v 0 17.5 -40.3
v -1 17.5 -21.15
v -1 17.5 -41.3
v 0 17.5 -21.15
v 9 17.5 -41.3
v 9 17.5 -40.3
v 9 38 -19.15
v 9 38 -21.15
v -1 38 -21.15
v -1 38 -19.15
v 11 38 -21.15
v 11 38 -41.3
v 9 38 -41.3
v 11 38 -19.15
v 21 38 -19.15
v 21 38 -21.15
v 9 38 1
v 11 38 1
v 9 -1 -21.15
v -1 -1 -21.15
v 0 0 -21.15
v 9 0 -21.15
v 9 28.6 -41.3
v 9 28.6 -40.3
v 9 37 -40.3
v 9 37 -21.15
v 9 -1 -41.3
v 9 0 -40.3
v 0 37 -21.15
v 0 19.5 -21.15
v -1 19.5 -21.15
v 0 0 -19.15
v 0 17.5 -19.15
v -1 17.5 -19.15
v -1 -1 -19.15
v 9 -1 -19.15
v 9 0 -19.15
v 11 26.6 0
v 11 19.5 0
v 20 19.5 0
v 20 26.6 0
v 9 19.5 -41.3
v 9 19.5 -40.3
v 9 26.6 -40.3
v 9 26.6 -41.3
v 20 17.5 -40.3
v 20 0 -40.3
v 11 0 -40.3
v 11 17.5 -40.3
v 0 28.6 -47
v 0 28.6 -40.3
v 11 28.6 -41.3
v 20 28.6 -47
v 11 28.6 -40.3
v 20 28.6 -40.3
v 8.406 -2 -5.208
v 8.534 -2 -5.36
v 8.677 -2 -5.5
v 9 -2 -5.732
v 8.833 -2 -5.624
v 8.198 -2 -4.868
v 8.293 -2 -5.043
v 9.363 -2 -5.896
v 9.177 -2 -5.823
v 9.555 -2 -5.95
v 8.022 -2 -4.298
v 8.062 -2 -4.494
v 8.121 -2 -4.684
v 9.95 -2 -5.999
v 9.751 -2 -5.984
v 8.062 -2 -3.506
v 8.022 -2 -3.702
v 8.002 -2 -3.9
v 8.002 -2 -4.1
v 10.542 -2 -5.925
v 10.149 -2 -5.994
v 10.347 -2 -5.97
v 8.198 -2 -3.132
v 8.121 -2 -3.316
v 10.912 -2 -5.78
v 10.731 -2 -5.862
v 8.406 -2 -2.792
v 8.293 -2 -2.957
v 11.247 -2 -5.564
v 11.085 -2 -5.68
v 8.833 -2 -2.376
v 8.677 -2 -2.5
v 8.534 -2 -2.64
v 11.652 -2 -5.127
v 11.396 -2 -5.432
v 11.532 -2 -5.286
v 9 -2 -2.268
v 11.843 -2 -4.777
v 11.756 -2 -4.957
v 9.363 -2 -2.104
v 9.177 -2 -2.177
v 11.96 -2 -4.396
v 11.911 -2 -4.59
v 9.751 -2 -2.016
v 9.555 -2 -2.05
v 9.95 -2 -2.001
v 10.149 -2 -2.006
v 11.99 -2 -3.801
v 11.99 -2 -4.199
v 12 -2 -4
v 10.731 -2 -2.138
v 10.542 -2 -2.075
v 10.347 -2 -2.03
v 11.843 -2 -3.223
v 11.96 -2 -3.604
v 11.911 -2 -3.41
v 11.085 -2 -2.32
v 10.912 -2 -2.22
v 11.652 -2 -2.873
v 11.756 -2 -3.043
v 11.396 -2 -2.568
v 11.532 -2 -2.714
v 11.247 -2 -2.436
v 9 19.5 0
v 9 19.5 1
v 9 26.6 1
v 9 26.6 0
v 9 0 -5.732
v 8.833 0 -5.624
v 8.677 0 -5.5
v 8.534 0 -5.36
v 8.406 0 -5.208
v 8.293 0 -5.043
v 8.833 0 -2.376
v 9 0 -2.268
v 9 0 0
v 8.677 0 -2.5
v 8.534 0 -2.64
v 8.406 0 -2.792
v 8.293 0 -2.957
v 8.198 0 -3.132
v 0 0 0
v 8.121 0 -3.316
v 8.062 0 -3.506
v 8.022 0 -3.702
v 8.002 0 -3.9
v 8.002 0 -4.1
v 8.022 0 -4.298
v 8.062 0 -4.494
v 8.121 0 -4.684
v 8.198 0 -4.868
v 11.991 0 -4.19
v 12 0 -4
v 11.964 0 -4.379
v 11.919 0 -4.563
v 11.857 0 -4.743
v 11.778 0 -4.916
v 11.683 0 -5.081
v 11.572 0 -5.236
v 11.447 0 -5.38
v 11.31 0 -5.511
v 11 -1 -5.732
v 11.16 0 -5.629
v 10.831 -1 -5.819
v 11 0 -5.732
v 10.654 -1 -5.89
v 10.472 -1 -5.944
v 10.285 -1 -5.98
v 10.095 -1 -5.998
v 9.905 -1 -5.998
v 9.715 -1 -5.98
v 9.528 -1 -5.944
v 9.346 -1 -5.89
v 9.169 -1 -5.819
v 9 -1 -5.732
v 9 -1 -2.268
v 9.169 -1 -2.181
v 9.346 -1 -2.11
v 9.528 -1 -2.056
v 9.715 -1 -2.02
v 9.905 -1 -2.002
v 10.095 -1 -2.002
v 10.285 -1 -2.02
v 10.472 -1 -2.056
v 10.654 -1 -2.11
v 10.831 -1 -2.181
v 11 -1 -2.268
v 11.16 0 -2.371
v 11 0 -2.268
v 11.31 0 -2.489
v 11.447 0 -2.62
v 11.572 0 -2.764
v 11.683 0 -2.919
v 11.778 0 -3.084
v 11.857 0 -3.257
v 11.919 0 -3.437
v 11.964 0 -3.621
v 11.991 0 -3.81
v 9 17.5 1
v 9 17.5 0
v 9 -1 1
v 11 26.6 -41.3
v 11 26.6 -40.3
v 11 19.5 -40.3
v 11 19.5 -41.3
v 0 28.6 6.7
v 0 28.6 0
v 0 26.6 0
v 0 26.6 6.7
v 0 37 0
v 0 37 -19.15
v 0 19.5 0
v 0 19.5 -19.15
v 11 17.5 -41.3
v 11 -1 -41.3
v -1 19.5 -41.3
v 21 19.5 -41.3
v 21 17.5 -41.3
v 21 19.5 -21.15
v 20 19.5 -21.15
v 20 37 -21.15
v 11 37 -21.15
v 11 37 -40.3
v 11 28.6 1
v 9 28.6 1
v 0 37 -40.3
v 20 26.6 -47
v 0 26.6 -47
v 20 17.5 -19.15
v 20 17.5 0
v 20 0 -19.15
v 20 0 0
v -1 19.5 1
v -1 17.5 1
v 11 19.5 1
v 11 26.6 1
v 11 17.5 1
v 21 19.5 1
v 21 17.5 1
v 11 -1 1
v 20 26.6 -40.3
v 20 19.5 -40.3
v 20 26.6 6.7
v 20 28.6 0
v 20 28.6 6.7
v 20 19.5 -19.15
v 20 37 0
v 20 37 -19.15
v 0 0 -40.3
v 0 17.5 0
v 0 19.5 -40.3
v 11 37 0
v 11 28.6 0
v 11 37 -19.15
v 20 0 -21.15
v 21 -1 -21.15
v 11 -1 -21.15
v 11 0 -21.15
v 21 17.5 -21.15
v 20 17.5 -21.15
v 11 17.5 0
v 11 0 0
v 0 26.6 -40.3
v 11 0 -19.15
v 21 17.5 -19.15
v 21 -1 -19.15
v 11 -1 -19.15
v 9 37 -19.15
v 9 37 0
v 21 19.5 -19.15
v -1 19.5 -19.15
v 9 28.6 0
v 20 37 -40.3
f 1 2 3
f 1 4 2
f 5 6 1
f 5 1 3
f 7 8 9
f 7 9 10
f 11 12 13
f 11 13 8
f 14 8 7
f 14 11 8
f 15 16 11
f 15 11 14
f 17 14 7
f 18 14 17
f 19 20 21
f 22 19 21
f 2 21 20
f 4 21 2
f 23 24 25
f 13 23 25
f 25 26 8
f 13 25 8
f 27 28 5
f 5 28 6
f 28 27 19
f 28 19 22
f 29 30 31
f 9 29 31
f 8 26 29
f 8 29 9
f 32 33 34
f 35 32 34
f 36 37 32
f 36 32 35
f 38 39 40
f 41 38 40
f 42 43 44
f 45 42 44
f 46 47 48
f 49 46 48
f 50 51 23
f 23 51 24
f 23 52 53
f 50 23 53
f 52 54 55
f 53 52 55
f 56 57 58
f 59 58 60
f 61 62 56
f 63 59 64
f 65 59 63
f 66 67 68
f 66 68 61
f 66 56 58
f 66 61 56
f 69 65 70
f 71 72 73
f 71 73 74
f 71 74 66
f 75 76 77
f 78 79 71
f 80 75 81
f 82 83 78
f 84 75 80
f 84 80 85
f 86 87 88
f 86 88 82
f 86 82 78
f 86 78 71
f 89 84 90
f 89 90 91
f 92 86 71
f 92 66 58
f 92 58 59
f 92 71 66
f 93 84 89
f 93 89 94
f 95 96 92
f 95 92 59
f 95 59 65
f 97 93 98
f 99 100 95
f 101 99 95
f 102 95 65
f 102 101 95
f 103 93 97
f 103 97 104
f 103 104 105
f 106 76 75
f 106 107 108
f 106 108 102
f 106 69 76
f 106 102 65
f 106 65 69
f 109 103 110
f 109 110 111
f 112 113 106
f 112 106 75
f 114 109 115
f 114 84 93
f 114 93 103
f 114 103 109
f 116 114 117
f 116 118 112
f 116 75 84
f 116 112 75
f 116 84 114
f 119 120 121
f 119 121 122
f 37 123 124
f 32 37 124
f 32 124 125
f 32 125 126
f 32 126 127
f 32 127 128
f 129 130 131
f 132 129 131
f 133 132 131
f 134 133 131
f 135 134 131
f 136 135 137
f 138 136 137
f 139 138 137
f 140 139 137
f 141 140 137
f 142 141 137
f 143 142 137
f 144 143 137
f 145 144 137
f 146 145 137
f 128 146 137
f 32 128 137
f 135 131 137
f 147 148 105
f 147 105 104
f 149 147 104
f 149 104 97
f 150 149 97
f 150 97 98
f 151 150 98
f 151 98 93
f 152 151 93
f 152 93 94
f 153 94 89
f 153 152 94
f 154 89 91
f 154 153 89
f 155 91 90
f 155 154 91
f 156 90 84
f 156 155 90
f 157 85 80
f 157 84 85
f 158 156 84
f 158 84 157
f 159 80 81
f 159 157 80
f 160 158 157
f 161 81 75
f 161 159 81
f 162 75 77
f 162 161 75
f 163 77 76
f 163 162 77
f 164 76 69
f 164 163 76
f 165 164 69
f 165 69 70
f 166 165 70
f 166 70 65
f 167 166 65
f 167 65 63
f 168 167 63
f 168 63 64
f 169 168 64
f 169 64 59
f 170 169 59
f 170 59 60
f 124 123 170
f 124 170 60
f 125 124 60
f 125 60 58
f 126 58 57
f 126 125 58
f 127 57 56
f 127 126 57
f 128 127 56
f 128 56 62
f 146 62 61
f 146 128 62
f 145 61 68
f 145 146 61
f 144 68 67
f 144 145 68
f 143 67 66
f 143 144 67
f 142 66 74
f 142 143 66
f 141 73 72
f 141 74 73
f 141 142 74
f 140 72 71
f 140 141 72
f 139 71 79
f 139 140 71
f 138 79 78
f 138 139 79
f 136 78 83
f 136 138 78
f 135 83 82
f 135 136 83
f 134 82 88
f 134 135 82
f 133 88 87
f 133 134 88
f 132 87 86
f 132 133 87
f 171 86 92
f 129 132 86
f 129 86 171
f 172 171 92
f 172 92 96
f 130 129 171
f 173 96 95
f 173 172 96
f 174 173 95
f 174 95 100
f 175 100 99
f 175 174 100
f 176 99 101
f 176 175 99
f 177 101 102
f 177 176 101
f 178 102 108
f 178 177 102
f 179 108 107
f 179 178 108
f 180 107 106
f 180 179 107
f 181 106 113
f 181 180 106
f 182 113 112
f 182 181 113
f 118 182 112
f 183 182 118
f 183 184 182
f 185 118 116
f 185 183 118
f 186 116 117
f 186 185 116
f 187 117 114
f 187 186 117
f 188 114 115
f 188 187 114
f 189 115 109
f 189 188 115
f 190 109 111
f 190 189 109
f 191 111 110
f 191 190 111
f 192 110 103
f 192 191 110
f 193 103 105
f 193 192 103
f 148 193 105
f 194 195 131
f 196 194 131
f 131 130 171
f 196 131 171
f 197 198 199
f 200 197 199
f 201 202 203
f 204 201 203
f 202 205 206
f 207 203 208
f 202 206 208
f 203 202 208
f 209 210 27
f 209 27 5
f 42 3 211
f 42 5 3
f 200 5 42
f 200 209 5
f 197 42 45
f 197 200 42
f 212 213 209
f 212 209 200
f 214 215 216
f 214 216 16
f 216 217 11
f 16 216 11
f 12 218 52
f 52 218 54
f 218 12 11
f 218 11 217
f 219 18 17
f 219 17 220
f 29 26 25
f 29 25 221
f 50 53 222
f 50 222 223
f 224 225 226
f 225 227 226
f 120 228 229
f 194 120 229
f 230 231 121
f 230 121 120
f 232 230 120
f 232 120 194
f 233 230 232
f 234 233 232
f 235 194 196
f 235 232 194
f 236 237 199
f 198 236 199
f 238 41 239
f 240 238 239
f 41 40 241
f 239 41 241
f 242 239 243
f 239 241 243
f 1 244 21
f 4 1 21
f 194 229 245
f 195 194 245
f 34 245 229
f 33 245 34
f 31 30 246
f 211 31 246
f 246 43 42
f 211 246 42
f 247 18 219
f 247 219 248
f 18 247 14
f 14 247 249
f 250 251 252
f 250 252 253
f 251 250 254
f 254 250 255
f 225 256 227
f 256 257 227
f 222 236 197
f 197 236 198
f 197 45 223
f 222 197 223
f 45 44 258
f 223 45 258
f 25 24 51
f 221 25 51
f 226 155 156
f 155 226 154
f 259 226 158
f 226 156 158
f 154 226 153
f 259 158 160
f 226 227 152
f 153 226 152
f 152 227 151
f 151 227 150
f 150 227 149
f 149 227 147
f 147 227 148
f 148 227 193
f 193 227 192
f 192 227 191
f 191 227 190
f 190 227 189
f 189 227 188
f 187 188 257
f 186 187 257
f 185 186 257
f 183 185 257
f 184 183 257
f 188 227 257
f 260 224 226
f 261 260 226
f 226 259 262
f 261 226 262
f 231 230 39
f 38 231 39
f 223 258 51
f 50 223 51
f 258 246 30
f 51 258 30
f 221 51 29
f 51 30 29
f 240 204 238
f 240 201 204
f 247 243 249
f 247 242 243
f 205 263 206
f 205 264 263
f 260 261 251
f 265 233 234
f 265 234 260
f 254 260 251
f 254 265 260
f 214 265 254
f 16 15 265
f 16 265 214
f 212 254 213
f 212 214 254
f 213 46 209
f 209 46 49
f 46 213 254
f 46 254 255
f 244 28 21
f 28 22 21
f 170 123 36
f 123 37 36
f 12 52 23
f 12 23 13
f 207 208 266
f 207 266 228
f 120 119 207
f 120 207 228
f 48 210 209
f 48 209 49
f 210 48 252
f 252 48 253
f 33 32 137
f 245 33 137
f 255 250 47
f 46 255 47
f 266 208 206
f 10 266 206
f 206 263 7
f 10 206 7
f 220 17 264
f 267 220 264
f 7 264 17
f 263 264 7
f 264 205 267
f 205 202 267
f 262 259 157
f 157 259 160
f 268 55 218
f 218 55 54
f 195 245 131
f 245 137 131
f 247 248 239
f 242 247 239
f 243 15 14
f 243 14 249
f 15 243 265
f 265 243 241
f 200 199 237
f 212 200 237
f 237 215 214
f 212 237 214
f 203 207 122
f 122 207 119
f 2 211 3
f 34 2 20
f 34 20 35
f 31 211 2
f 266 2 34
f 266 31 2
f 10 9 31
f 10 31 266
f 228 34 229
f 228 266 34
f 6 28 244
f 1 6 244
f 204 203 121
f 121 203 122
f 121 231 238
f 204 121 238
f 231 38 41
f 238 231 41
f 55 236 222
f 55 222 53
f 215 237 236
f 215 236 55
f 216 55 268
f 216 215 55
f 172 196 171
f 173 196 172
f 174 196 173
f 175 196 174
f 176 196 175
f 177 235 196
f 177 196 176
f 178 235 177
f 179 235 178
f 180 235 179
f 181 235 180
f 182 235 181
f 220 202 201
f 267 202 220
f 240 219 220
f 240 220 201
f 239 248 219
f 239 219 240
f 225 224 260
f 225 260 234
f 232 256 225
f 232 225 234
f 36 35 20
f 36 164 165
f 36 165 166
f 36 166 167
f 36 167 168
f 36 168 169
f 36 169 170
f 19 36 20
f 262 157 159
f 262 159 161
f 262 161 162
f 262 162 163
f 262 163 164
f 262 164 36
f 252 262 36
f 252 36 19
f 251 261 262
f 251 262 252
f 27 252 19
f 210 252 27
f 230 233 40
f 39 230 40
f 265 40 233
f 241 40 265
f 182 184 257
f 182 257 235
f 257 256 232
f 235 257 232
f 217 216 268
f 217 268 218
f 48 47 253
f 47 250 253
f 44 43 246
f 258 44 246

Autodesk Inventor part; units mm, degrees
ref_plane "YZ Plane" through (0, 0, 0) normal (1, 0, 0) x (0, 1, 0)
ref_plane "XZ Plane" through (0, 0, 0) normal (0, 1, 0) x (-1, 0, 0)
ref_plane "XY Plane" through (0, 0, 0) normal (0, 0, 1) x (1, 0, 0)
sketch "Sketch1" plane through (0, 0, 0) normal (0, 1, 0) x (-1, 0, 0)
  line L0 (0, 0) -> (-20, 0)
  line L1 (-20, 0) -> (-20, -40.3)
  line L2 (-20, -40.3) -> (0, -40.3)
  line L3 (0, -40.3) -> (0, 0)
  dimension "d0" = 20
  dimension "d1" = 40.3
extrude "Extrusion1" add sketch "Sketch1" along normal blind 37
sketch "Sketch2" plane through (20, 0, 0) normal (1, 0, 0) x (0, 0, -1)
  line L0 (0, 0) -> (40.3, 0) projected
  line L1 (40.3, 0) -> (40.3, 37) projected
  line L2 (21.15, 37) -> (19.15, 37)
  line L3 (19.15, 37) -> (19.15, 0)
  line L4 (19.15, 0) -> (21.15, 0)
  line L5 (21.15, 0) -> (21.15, 37)
  line L6 (0, 37) -> (40.3, 37) projected
  line L7 (0, 19.5) -> (40.3, 19.5)
  line L8 (40.3, 19.5) -> (40.3, 17.5)
  line L9 (40.3, 17.5) -> (0, 17.5)
  line L10 (0, 17.5) -> (0, 19.5)
  line L11 (0, 0) -> (0, 37) projected
  point P0 (19.15, 19.5)
  point P1 (19.15, 17.5)
  point P2 (21.15, 17.5)
  point P3 (21.15, 19.5)
  dimension "d5" = 2
  dimension "d6" = 19.15
  dimension "d7" = 0
  dimension "d9" = 2
  dimension "d10" = 17.5
  dimension "d11" = 0
extrude "Extrusion2" add sketch "Sketch2" along normal blind 1 contours L3 L9 L5 L0 | L10 L7 L3 L9 | L3 L7 L5 L9 | L5 L7 L1 L9 | L3 L2 L5 L7
sketch "Sketch3" plane through (0, 0, 0) normal (0, -1, 0) x (1, 0, 0)
  line L0 (0, 0) -> (20, 0) projected
  line L1 (0, -40.3) -> (0, 0) projected
  line L2 (20, -40.3) -> (0, -40.3) projected
  line L3 (20, -21.15) -> (21, -21.15) projected
  line L4 (21, -19.15) -> (21, -21.15) projected
  line L5 (20, -19.15) -> (21, -19.15) projected
  line L6 (21, -19.15) -> (0, -19.15)
  line L7 (0, -19.15) -> (0, -21.15)
  line L8 (0, -21.15) -> (21, -21.15)
  line L9 (21, -21.15) -> (21, -19.15)
  line L10 (0, 0) -> (20, 0) projected
  line L11 (11, 0) -> (9, 0)
  line L12 (9, 0) -> (9, -40.3)
  line L13 (9, -40.3) -> (11, -40.3)
  line L14 (11, -40.3) -> (11, 0)
  line L15 (9, -40.3) -> (9, 0)
  point P0 (9, -21.15)
  point P1 (11, -21.15)
  point P2 (11, -19.15)
  point P3 (9, -19.15)
  dimension "d14" = 10
  dimension "d15" = 12
  dimension "d16" = 0
extrude "Extrusion3" add sketch "Sketch3" along normal blind 1 contours L0 L14 L6 L12 | L6 L12 L8 L1 | L6 L14 L8 L12 | L6 L5 L4 L3 L8 L14 | L8 L14 L2 L12
sketch "Sketch4" plane through (20, 37, -40.3) normal (0, 0, -1) x (-1, 0, 0)
  line L0 (9, -37) -> (9, -38) projected
  line L1 (11, -38) -> (9, -38) projected
  line L2 (11, -37) -> (11, -38) projected
  line L3 (20, -37) -> (20, 0) projected
  line L4 (0, 0) -> (20, 0) projected
  line L5 (0, -17.5) -> (-1, -17.5) projected
  line L6 (-1, -19.5) -> (-1, -17.5) projected
  line L7 (0, -19.5) -> (-1, -19.5) projected
  line L8 (9, -38) -> (11, -38)
  line L9 (11, -38) -> (11, 0)
  line L10 (11, 0) -> (9, 0)
  line L11 (9, 0) -> (9, -38)
  line L12 (-1, -19.5) -> (20, -19.5)
  line L13 (20, -19.5) -> (20, -17.5)
  line L14 (20, -17.5) -> (-1, -17.5)
  line L15 (-1, -17.5) -> (-1, -19.5)
  point P0 (11, -17.5)
  point P1 (9, -17.5)
  point P2 (9, -19.5)
  point P3 (11, -19.5)
extrude "Extrusion4" add sketch "Sketch4" along normal blind 1 contours L11 L12 L9 L2 L1 L0 | L12 L7 L6 L5 L14 L11 | L11 L14 L9 L12 | L11 L4 L9 L14 | L9 L14 L3 L12
sketch "Sketch5" plane through (0, 37, 0) normal (0, 1, 0) x (1, 0, 0)
  line L0 (20, 19.15) -> (21, 19.15) projected
  line L1 (21, 21.15) -> (21, 19.15) projected
  line L2 (20, 21.15) -> (21, 21.15) projected
  line L3 (11, 40.3) -> (11, 41.3) projected
  line L4 (9, 41.3) -> (11, 41.3) projected
  line L5 (9, 40.3) -> (9, 41.3) projected
  line L6 (0, 40.3) -> (0, 0) projected
  line L7 (0, 0) -> (20, 0) projected
  line L8 (9, 0) -> (9, 19.15) projected
  line L9 (11, 41.3) -> (9, 41.3)
  line L10 (9, 41.3) -> (9, 0)
  line L11 (9, 0) -> (11, 0)
  line L12 (11, 0) -> (11, 41.3)
  line L13 (9, 19.15) -> (0, 19.15) projected
  line L14 (21, 21.15) -> (0, 21.15)
  line L15 (0, 21.15) -> (0, 19.15)
  line L16 (0, 19.15) -> (21, 19.15)
  line L17 (21, 19.15) -> (21, 21.15)
  point P0 (11, 19.15)
  point P1 (11, 21.15)
  point P2 (9, 21.15)
extrude "Extrusion5" add sketch "Sketch5" along normal blind 1 contours L16 L12 L14 L2 L1 L0 | L16 L10 L14 L12 | L12 L7 L8 L16 | L14 L10 L5 L4 L3 L12 | L13 L6 L14 L10
sketch "Sketch6" plane through (0, 0, 0) normal (0, 0, 1) x (1, 0, 0)
  line L0 (9, 0) -> (9, -1) projected
  line L1 (11, -1) -> (9, -1) projected
  line L2 (11, 0) -> (11, -1) projected
  line L3 (20, 17.5) -> (21, 17.5) projected
  line L4 (21, 19.5) -> (21, 17.5) projected
  line L5 (20, 19.5) -> (21, 19.5) projected
  line L6 (11, 37) -> (11, 38) projected
  line L7 (9, 38) -> (11, 38) projected
  line L8 (9, 37) -> (9, 38) projected
  line L9 (0, 0) -> (0, 37) projected
  line L10 (11, 37) -> (11, 38) projected
  line L11 (0, -1) -> (9, -1) projected
  line L12 (11, 38) -> (9, 38)
  line L13 (9, 38) -> (9, -1)
  line L14 (9, -1) -> (11, -1)
  line L15 (11, -1) -> (11, 38)
  line L16 (21, 19.5) -> (21, 17.5) projected
  line L17 (0, 0) -> (0, 17.5) projected
  line L18 (21, 19.5) -> (0, 19.5)
  line L19 (0, 19.5) -> (0, 17.5)
  line L20 (0, 17.5) -> (21, 17.5)
  line L21 (21, 17.5) -> (21, 19.5)
  point P0 (11, 17.5)
  point P1 (11, 19.5)
  point P2 (9, 19.5)
  point P3 (9, 17.5)
extrude "Extrusion6" add sketch "Sketch6" along normal blind 1
sketch "Sketch7" plane through (0, 0, -40.3) normal (-1, 0, 0) x (0, 0, 1)
  line L0 (19.15, 0) -> (19.15, -1) projected
  line L1 (21.15, -1) -> (19.15, -1) projected
  line L2 (21.15, 0) -> (21.15, -1) projected
  line L3 (40.3, 17.5) -> (41.3, 17.5) projected
  line L4 (41.3, 19.5) -> (41.3, 17.5) projected
  line L5 (40.3, 19.5) -> (41.3, 19.5) projected
  line L6 (21.15, 37) -> (21.15, 38) projected
  line L7 (19.15, 38) -> (21.15, 38) projected
  line L8 (19.15, 37) -> (19.15, 38) projected
  line L9 (0, 19.5) -> (-1, 19.5) projected
  line L10 (-1, 17.5) -> (-1, 19.5) projected
  line L11 (0, 17.5) -> (-1, 17.5) projected
  line L12 (19.15, -1) -> (21.15, -1) projected
  line L13 (21.15, -1) -> (19.15, -1)
  line L14 (19.15, -1) -> (19.15, 38)
  line L15 (19.15, 38) -> (21.15, 38)
  line L16 (21.15, 38) -> (21.15, -1)
  line L17 (41.3, 17.5) -> (-1, 17.5)
  line L18 (-1, 17.5) -> (-1, 19.5)
  line L19 (-1, 19.5) -> (41.3, 19.5)
  line L20 (41.3, 19.5) -> (41.3, 17.5)
  point P0 (21.15, 19.5)
  point P1 (19.15, 19.5)
  point P2 (19.15, 17.5)
  point P3 (21.15, 17.5)
extrude "Extrusion7" add sketch "Sketch7" along normal blind 1
sketch "Sketch8" plane through (0, 0, 0) normal (0, -1, 0) x (1, 0, 0)
  circle A0 centre (10, -4) radius 2
  point P0 (0, 0)
  dimension "d27" = 4
extrude "Extrusion8" add sketch "Sketch8" along normal blind 2
sketch "Sketch9" plane through (0, 0, 0) normal (0, 0, 1) x (1, 0, 0)
  line L0 (0, 37) -> (0, 19.5) projected
  line L1 (0, 0) -> (26.6, 0) construction
  line L2 (0, 26.6) -> (20, 26.6)
  line L3 (20, 19.5) -> (20, 37) projected
  line L4 (20, 26.6) -> (0, 26.6)
  line L5 (0, 26.6) -> (0, 28.6)
  line L6 (0, 28.6) -> (20, 28.6)
  line L7 (20, 28.6) -> (20, 26.6)
  dimension "d30" = 26.6
  dimension "d32" = 20
  dimension "d33" = 2
extrude "Extrusion9" add sketch "Sketch9" along normal blind 6.7
sketch "Sketch10" plane through (20, 19.5, -40.3) normal (0, 0, -1) x (-1, 0, 0)
  line L0 (0, 0) -> (0, 17.5) projected
  line L1 (9, 9.1) -> (0, 9.1) projected
  line L2 (0, 7.1) -> (9, 7.1) projected
  line L3 (20, 9.1) -> (11, 9.1) projected
  line L4 (0, 7.1) -> (20, 7.1)
  line L5 (20, 7.1) -> (20, 9.1)
  line L6 (20, 9.1) -> (0, 9.1)
  line L7 (0, 9.1) -> (0, 7.1)
  point P0 (20, -19.5)
extrude "Extrusion10" add sketch "Sketch10" along normal blind 6.7
properties part number "Motor"
